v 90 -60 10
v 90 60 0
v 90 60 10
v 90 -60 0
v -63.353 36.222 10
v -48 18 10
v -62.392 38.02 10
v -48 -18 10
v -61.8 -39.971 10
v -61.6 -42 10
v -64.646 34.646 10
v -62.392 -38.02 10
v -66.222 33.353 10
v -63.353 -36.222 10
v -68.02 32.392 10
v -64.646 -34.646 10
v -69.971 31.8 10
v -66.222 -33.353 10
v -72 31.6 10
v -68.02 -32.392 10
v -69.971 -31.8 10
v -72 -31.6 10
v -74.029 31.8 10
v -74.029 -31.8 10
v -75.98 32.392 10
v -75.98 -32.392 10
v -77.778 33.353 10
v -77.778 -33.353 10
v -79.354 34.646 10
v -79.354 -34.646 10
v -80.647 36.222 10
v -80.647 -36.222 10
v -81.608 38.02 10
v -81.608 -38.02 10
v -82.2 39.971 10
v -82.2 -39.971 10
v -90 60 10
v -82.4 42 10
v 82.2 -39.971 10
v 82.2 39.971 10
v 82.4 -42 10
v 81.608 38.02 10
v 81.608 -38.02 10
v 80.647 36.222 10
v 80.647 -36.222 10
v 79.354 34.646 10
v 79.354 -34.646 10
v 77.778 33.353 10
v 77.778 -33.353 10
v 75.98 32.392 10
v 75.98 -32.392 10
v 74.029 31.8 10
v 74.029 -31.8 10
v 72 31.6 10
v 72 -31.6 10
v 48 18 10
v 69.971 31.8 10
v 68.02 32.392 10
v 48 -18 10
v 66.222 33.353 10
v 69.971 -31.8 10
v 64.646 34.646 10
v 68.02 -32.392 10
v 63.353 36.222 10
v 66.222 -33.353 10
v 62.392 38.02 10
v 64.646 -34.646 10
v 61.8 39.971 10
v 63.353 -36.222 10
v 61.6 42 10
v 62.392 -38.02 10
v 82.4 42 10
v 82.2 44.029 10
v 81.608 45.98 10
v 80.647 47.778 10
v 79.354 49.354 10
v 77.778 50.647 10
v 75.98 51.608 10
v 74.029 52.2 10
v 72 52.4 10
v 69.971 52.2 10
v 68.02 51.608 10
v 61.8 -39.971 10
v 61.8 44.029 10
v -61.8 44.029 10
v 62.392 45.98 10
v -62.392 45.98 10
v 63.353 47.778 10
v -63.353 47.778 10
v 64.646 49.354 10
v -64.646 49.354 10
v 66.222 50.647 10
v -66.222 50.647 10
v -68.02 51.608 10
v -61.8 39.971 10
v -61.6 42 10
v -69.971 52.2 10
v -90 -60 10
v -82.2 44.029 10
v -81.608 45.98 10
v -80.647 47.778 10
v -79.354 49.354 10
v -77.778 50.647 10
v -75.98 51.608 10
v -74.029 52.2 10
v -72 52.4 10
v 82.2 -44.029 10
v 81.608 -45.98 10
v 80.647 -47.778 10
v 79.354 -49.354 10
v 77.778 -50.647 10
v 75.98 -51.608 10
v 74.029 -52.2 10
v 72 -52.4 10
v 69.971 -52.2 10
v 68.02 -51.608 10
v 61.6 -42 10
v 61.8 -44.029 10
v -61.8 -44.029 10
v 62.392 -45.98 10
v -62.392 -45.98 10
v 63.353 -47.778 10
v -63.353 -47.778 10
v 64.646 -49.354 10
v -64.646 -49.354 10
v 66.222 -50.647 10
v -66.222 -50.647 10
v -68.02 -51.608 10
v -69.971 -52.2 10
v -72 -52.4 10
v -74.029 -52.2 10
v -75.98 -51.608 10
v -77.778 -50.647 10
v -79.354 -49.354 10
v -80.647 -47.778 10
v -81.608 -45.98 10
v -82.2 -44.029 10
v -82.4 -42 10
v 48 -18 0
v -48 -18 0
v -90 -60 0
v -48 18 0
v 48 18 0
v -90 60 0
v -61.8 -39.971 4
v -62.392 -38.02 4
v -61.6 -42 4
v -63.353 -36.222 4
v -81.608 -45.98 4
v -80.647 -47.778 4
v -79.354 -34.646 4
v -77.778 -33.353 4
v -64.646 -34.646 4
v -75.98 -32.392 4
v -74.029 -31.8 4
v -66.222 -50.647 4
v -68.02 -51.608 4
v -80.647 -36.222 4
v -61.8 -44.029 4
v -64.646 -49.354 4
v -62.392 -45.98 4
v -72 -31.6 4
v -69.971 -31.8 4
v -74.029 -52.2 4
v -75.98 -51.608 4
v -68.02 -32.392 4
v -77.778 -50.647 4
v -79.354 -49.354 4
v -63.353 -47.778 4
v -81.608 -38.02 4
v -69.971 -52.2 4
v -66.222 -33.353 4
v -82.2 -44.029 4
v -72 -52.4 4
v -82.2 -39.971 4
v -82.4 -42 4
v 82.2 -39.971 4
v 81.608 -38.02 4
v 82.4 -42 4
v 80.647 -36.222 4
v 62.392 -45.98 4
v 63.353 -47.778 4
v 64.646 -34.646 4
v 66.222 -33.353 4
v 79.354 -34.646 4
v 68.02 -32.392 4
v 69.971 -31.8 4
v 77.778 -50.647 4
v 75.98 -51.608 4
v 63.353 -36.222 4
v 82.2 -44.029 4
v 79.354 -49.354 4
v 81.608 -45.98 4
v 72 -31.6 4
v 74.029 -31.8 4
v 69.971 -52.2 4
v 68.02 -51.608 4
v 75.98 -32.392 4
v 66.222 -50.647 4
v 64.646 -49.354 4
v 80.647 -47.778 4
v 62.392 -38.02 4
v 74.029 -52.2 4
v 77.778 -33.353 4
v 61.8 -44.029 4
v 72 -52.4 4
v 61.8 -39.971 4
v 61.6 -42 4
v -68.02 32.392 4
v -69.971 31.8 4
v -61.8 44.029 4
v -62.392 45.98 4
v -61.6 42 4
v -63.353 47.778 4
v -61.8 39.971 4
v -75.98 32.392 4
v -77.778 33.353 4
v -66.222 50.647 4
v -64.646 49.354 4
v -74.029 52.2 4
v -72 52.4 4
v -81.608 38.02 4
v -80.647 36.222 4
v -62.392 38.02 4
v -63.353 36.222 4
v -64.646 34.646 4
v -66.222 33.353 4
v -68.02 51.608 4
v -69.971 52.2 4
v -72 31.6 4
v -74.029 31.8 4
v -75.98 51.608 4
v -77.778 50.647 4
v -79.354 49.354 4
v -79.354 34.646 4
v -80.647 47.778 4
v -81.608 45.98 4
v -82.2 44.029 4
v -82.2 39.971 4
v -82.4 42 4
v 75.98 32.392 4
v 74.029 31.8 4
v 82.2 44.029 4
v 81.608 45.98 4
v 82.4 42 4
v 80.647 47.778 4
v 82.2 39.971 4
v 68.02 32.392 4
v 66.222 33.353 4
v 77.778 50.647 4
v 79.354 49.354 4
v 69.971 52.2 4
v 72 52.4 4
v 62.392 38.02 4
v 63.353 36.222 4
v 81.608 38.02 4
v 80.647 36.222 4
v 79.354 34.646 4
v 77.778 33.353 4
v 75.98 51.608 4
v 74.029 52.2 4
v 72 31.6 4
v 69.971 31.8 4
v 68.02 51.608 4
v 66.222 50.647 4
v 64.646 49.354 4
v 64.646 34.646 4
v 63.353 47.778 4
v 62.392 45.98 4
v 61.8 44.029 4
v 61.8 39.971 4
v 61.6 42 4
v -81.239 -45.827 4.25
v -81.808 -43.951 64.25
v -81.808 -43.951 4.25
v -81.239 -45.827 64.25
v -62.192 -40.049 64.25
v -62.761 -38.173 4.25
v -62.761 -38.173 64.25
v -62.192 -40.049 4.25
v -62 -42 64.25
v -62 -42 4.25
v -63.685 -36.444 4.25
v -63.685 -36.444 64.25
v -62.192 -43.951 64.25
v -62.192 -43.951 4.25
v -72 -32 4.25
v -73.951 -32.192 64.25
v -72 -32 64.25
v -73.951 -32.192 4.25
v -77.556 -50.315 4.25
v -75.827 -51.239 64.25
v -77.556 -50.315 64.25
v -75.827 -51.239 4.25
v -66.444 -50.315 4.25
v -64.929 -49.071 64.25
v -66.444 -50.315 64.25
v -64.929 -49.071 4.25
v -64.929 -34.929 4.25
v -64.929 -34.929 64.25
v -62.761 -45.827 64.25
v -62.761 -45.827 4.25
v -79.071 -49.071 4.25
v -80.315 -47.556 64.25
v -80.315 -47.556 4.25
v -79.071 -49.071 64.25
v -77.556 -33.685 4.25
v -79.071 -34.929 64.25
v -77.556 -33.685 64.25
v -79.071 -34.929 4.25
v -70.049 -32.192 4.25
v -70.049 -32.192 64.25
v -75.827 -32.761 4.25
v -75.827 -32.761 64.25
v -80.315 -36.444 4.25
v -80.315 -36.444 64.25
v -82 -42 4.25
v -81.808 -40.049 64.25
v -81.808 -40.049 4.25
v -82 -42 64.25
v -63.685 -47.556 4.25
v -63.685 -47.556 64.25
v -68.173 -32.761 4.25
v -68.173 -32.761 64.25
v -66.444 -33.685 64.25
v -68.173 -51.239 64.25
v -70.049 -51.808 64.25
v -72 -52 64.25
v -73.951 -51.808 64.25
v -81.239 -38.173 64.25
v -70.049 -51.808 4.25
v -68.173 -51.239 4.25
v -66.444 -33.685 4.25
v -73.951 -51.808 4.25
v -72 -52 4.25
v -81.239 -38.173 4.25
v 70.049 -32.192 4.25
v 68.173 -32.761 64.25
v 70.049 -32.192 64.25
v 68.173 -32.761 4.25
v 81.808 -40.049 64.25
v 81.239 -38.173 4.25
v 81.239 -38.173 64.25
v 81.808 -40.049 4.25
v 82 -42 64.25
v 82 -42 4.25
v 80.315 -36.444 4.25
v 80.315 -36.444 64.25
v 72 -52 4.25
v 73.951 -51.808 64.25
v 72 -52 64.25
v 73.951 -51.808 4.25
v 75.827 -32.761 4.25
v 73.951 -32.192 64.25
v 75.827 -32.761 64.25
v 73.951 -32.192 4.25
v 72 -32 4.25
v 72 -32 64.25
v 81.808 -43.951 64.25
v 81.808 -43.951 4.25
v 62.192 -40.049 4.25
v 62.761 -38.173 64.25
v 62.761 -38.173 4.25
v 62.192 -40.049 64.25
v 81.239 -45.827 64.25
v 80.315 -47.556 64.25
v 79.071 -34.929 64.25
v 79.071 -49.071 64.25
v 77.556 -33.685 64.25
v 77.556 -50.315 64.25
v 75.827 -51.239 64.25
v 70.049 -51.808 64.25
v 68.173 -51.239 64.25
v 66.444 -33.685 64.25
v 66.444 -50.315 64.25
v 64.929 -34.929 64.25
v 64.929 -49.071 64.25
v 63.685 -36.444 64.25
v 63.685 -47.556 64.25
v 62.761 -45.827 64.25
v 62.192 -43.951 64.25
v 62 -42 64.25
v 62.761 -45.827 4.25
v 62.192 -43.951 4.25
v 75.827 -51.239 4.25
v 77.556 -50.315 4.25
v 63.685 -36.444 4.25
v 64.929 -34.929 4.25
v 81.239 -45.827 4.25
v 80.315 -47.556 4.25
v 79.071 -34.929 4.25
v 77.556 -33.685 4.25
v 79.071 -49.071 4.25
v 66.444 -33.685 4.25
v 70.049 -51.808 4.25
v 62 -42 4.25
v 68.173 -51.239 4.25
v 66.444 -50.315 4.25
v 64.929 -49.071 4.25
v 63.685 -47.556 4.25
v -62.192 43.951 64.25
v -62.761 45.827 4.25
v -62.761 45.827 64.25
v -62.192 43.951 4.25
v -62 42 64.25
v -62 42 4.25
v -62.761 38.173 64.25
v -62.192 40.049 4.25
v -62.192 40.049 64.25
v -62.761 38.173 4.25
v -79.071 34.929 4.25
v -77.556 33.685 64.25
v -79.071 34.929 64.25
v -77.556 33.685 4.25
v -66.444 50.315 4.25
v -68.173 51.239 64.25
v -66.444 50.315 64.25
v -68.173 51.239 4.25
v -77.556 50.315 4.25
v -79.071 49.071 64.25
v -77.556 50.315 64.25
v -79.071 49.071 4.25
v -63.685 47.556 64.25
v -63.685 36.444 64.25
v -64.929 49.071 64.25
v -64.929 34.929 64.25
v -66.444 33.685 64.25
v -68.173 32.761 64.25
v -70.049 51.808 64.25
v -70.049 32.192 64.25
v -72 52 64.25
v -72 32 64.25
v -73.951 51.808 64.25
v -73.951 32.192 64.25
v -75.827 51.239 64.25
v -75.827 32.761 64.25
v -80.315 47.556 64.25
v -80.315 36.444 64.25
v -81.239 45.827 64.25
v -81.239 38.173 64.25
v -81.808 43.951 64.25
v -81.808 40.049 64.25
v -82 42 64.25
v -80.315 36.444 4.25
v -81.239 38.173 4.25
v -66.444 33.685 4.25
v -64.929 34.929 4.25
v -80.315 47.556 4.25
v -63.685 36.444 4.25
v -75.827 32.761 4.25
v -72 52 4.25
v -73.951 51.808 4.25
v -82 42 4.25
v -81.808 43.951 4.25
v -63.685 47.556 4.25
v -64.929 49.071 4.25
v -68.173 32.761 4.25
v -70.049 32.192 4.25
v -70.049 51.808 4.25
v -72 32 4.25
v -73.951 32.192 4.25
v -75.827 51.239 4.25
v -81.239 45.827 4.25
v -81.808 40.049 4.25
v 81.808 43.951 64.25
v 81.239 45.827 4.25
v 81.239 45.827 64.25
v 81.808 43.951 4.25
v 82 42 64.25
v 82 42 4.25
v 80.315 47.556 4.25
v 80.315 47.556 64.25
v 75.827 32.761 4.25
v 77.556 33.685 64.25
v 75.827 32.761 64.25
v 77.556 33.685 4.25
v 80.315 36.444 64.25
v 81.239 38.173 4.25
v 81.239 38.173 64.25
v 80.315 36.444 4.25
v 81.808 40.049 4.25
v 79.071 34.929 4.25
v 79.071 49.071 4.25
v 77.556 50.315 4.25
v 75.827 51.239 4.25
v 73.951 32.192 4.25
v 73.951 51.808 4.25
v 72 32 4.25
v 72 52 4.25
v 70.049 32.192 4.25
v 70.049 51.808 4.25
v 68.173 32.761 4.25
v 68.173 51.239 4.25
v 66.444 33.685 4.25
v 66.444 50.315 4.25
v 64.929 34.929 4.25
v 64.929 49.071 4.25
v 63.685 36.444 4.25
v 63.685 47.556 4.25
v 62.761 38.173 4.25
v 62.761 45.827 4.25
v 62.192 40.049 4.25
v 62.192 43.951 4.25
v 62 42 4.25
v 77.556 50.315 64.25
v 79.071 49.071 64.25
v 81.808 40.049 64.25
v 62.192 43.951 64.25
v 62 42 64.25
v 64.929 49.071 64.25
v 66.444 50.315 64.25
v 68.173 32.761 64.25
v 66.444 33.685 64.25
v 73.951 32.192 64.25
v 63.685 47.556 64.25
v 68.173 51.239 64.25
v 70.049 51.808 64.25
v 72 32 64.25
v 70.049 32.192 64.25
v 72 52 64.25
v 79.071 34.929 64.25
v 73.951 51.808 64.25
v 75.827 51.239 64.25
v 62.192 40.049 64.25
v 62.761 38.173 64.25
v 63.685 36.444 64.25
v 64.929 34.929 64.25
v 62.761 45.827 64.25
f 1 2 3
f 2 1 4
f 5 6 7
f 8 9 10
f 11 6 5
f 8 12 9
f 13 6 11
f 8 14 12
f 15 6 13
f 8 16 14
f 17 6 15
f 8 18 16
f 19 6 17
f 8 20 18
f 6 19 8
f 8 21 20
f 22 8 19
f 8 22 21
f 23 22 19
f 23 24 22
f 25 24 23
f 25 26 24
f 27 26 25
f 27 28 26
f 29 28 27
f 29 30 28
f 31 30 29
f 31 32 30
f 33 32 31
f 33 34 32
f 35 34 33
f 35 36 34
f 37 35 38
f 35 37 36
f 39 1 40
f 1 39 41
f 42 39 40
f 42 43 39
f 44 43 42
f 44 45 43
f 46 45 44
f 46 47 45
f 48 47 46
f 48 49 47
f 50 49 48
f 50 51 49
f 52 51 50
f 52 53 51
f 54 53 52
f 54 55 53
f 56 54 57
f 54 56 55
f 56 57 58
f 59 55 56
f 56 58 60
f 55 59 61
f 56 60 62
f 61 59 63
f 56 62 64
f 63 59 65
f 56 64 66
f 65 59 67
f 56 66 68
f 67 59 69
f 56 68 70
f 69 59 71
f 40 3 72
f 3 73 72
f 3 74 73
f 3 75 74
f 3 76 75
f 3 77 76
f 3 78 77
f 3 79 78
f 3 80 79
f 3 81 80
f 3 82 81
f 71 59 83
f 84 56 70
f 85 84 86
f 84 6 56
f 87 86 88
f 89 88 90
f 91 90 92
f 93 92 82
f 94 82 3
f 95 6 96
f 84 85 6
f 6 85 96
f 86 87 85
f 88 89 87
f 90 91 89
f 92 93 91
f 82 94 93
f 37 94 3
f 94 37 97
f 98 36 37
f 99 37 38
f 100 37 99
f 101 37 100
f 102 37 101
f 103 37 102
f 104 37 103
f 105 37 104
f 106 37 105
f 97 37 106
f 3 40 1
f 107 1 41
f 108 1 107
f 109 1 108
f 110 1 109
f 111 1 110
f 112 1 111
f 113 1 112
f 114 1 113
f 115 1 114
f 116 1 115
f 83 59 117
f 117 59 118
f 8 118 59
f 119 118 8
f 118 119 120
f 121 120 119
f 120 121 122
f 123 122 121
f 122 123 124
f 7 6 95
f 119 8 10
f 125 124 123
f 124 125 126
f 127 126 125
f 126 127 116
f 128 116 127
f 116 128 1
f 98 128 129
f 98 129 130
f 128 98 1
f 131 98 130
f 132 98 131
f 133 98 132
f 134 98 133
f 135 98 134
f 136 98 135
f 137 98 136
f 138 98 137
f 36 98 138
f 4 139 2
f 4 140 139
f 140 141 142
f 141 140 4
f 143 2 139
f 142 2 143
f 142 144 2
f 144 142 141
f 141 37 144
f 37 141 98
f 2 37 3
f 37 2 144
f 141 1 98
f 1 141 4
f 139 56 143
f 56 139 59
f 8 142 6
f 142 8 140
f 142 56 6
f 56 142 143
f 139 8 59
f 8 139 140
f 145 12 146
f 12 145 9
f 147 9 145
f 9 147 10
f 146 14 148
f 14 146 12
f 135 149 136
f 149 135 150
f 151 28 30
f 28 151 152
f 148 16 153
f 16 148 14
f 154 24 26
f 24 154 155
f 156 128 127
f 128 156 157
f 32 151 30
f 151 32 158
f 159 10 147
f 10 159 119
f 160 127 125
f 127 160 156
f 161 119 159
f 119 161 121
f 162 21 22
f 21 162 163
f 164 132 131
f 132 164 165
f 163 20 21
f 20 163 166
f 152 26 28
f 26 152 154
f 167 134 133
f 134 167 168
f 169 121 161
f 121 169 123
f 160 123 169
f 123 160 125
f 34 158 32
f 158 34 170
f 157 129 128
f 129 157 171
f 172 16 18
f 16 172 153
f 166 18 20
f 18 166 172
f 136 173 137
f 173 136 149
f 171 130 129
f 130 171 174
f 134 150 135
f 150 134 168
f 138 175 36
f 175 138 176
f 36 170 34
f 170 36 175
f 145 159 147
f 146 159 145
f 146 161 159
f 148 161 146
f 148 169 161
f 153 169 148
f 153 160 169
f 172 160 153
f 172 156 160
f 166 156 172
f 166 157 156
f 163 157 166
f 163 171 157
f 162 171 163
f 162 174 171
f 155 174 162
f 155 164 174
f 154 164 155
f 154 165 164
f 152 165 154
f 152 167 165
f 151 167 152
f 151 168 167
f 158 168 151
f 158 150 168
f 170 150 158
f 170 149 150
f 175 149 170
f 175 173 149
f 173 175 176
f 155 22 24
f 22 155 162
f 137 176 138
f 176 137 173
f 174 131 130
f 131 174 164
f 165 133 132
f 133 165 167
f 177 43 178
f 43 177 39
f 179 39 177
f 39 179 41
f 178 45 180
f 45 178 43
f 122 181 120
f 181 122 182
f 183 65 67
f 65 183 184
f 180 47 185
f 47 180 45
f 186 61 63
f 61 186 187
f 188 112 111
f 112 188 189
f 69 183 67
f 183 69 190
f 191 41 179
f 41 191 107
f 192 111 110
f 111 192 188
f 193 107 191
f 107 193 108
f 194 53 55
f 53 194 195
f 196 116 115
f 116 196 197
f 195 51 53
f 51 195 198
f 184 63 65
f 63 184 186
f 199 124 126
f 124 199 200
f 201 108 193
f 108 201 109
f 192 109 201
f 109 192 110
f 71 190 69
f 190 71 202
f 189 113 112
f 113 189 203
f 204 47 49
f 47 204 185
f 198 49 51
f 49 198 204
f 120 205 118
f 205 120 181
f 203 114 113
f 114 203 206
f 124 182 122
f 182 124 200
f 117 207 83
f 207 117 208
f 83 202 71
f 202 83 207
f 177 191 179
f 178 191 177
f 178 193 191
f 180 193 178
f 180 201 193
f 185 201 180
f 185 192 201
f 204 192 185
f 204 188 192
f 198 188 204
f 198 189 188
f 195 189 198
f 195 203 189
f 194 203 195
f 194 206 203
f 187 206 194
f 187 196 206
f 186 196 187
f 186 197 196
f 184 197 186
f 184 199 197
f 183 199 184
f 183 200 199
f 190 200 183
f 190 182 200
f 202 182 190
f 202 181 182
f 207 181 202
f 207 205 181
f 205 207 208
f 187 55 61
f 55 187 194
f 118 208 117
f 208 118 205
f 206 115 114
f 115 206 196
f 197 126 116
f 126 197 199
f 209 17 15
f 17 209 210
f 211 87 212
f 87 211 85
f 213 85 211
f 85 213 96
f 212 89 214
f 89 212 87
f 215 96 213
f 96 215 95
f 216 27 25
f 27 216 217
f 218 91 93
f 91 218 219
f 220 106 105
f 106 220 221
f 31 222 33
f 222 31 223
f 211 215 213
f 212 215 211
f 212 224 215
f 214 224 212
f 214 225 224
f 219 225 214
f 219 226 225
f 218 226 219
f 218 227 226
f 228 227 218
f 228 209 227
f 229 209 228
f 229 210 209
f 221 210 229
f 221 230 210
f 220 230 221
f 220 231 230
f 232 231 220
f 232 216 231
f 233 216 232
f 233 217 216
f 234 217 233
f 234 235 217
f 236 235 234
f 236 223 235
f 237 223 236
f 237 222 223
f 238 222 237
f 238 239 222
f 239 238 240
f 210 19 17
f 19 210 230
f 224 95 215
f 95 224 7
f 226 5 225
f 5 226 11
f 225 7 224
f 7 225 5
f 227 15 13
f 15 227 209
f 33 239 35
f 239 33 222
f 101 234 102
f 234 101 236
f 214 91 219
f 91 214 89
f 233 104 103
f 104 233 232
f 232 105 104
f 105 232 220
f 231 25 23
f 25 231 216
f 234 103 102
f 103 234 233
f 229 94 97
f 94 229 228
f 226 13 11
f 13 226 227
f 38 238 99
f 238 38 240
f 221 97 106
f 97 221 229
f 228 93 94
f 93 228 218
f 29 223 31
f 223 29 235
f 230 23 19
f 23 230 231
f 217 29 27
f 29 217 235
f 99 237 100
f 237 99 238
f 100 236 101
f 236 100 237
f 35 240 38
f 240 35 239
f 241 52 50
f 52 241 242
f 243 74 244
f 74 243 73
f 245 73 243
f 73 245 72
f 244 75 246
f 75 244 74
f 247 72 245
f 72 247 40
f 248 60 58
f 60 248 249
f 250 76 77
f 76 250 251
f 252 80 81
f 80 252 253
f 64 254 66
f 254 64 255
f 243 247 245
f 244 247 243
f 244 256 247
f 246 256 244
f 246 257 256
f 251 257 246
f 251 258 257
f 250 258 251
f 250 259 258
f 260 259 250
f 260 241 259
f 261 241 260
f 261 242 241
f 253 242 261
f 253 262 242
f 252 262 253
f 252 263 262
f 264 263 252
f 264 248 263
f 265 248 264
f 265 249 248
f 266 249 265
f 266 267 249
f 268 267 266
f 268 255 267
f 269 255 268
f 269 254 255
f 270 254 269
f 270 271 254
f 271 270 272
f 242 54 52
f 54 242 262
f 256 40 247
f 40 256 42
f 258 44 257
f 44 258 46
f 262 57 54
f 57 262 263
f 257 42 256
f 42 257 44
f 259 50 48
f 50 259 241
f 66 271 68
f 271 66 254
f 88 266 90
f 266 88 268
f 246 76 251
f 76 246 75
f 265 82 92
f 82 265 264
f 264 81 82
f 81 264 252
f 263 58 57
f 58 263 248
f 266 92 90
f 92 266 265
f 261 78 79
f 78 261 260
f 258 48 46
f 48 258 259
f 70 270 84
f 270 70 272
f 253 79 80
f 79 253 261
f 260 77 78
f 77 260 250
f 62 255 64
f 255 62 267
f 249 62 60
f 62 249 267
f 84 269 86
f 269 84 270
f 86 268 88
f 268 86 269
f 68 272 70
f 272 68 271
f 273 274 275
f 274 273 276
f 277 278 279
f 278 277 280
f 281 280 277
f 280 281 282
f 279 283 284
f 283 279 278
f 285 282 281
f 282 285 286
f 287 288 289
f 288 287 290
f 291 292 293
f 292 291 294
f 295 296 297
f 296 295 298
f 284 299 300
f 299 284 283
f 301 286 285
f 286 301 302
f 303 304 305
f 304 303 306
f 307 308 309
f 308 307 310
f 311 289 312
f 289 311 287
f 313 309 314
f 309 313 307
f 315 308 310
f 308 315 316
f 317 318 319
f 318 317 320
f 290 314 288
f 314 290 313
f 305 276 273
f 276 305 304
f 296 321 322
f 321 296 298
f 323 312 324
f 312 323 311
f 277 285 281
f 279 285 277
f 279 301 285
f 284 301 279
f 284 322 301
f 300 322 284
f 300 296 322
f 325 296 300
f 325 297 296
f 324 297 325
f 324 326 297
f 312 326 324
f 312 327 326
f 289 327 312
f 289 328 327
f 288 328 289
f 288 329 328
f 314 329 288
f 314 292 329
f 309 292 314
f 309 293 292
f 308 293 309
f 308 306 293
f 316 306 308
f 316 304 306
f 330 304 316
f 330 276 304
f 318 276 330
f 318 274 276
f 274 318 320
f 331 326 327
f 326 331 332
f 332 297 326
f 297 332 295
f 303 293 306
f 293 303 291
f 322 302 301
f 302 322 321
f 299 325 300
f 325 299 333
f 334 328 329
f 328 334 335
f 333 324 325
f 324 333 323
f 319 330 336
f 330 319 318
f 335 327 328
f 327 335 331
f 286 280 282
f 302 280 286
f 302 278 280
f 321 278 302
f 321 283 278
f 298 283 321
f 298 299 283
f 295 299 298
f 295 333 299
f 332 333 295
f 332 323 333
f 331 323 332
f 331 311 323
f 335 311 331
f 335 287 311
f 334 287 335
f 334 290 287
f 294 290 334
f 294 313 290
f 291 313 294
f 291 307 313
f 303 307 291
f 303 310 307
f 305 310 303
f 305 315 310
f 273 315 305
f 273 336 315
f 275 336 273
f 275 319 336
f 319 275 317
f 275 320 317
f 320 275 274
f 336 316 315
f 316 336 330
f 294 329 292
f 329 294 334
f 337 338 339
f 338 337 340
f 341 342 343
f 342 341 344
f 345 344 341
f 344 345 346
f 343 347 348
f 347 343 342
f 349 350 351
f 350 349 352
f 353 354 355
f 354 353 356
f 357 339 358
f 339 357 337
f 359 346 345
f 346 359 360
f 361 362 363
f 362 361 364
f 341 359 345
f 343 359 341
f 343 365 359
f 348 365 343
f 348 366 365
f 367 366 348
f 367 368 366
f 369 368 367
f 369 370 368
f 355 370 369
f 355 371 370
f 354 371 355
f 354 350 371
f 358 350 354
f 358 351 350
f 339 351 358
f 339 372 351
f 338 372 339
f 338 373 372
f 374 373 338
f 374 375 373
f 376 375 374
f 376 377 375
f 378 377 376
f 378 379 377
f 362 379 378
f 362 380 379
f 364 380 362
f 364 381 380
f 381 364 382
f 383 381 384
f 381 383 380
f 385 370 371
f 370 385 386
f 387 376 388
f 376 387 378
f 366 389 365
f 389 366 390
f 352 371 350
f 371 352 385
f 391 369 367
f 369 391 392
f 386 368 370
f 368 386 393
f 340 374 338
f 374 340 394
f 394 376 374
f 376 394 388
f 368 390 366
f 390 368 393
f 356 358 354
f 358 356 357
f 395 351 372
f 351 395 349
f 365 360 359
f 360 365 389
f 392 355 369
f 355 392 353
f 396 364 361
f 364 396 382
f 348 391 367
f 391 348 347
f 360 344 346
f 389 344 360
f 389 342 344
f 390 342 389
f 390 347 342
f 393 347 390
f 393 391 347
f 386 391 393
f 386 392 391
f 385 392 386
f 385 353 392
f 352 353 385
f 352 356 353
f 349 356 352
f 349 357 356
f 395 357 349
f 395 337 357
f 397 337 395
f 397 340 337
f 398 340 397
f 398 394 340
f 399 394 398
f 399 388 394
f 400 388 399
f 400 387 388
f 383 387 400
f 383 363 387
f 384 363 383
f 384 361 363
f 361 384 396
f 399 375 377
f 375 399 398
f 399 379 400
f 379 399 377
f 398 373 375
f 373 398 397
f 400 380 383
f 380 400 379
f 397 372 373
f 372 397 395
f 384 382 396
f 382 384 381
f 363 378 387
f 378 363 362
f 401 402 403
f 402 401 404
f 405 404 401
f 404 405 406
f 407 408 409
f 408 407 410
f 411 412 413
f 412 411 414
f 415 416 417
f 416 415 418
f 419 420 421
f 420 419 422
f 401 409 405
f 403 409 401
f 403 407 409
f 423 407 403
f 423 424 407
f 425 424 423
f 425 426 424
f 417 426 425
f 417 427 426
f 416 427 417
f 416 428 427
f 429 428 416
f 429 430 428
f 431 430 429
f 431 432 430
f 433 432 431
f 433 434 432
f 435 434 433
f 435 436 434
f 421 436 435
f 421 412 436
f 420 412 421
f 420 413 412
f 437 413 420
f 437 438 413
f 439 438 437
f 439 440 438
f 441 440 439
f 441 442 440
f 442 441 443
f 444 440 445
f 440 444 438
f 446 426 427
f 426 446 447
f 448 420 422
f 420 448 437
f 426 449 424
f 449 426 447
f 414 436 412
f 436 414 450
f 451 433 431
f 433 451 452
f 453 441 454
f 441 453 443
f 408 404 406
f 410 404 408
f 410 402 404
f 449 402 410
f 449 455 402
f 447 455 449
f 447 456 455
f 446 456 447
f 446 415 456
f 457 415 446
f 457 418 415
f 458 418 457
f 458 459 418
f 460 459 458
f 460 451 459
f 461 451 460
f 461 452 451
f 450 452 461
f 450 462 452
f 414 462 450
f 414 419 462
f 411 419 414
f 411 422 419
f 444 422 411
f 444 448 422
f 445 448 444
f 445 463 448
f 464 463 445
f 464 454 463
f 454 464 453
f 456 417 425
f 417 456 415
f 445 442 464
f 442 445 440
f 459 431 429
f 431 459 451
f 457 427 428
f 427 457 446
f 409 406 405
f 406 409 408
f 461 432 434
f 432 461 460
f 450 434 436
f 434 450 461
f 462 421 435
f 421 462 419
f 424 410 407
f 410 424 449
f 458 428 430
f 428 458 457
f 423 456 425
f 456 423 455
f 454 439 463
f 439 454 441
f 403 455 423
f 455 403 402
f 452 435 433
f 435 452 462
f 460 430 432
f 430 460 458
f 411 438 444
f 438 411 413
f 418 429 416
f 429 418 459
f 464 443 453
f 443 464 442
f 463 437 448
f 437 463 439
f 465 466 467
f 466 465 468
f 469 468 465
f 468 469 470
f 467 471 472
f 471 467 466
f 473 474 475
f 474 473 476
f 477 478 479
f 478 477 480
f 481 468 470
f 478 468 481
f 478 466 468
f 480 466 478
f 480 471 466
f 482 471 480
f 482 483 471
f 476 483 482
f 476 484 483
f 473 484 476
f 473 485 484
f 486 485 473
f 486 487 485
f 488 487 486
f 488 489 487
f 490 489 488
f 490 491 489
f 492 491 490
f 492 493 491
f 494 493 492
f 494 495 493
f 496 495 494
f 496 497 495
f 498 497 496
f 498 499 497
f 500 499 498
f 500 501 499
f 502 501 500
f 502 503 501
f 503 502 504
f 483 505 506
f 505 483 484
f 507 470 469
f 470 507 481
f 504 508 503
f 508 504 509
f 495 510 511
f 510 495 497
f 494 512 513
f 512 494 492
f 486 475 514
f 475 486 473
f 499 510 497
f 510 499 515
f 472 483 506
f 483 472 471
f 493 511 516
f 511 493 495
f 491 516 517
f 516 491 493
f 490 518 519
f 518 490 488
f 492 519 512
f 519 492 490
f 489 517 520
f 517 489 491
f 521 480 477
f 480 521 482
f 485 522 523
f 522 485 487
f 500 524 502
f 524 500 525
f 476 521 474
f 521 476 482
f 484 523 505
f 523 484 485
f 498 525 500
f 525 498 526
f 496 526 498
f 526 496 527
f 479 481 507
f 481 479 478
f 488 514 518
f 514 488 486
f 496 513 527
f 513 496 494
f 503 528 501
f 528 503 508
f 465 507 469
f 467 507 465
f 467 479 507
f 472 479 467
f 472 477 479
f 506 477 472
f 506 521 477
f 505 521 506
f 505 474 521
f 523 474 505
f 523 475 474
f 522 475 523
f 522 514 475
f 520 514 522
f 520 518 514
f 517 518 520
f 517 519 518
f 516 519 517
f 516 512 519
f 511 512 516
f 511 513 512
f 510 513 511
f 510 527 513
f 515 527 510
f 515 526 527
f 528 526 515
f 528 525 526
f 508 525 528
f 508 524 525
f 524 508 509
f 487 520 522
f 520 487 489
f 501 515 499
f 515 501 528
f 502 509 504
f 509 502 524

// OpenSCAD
$fn = 32;

// ------------------------------------------------------------------------
// Frame with four posts: 180 x 120 mm frame, four d20 posts
// Every part is its own module, assembly() places them once.
// ------------------------------------------------------------------------

// --- part 1 ---
module base_frame() {
  difference() {
    translate([-90, -60, 0]) cube([180, 120, 10]);
    translate([-48, -18, -1]) cube([96, 36, 12]);
    translate([-72, -42, 4]) cylinder(h = 7, d = 20.8);
    translate([72, -42, 4]) cylinder(h = 7, d = 20.8);
    translate([-72, 42, 4]) cylinder(h = 7, d = 20.8);
    translate([72, 42, 4]) cylinder(h = 7, d = 20.8);
  }
}

// --- part 2 ---
module post1() {
  cylinder(h = 60, d = 20);
}

// --- part 3 ---
module post2() {
  cylinder(h = 60, d = 20);
}

// --- part 4 ---
module post3() {
  cylinder(h = 60, d = 20);
}

// --- part 5 ---
module post4() {
  cylinder(h = 60, d = 20);
}

// --- assembly ---
module assembly() {
  translate([0, 0, 0]) rotate([0, 0, 0]) base_frame();
  translate([-72, -42, 4.25]) rotate([0, 0, 0]) post1();
  translate([72, -42, 4.25]) rotate([0, 0, 0]) post2();
  translate([-72, 42, 4.25]) rotate([0, 0, 0]) post3();
  translate([72, 42, 4.25]) rotate([0, 0, 0]) post4();
}

assembly();
